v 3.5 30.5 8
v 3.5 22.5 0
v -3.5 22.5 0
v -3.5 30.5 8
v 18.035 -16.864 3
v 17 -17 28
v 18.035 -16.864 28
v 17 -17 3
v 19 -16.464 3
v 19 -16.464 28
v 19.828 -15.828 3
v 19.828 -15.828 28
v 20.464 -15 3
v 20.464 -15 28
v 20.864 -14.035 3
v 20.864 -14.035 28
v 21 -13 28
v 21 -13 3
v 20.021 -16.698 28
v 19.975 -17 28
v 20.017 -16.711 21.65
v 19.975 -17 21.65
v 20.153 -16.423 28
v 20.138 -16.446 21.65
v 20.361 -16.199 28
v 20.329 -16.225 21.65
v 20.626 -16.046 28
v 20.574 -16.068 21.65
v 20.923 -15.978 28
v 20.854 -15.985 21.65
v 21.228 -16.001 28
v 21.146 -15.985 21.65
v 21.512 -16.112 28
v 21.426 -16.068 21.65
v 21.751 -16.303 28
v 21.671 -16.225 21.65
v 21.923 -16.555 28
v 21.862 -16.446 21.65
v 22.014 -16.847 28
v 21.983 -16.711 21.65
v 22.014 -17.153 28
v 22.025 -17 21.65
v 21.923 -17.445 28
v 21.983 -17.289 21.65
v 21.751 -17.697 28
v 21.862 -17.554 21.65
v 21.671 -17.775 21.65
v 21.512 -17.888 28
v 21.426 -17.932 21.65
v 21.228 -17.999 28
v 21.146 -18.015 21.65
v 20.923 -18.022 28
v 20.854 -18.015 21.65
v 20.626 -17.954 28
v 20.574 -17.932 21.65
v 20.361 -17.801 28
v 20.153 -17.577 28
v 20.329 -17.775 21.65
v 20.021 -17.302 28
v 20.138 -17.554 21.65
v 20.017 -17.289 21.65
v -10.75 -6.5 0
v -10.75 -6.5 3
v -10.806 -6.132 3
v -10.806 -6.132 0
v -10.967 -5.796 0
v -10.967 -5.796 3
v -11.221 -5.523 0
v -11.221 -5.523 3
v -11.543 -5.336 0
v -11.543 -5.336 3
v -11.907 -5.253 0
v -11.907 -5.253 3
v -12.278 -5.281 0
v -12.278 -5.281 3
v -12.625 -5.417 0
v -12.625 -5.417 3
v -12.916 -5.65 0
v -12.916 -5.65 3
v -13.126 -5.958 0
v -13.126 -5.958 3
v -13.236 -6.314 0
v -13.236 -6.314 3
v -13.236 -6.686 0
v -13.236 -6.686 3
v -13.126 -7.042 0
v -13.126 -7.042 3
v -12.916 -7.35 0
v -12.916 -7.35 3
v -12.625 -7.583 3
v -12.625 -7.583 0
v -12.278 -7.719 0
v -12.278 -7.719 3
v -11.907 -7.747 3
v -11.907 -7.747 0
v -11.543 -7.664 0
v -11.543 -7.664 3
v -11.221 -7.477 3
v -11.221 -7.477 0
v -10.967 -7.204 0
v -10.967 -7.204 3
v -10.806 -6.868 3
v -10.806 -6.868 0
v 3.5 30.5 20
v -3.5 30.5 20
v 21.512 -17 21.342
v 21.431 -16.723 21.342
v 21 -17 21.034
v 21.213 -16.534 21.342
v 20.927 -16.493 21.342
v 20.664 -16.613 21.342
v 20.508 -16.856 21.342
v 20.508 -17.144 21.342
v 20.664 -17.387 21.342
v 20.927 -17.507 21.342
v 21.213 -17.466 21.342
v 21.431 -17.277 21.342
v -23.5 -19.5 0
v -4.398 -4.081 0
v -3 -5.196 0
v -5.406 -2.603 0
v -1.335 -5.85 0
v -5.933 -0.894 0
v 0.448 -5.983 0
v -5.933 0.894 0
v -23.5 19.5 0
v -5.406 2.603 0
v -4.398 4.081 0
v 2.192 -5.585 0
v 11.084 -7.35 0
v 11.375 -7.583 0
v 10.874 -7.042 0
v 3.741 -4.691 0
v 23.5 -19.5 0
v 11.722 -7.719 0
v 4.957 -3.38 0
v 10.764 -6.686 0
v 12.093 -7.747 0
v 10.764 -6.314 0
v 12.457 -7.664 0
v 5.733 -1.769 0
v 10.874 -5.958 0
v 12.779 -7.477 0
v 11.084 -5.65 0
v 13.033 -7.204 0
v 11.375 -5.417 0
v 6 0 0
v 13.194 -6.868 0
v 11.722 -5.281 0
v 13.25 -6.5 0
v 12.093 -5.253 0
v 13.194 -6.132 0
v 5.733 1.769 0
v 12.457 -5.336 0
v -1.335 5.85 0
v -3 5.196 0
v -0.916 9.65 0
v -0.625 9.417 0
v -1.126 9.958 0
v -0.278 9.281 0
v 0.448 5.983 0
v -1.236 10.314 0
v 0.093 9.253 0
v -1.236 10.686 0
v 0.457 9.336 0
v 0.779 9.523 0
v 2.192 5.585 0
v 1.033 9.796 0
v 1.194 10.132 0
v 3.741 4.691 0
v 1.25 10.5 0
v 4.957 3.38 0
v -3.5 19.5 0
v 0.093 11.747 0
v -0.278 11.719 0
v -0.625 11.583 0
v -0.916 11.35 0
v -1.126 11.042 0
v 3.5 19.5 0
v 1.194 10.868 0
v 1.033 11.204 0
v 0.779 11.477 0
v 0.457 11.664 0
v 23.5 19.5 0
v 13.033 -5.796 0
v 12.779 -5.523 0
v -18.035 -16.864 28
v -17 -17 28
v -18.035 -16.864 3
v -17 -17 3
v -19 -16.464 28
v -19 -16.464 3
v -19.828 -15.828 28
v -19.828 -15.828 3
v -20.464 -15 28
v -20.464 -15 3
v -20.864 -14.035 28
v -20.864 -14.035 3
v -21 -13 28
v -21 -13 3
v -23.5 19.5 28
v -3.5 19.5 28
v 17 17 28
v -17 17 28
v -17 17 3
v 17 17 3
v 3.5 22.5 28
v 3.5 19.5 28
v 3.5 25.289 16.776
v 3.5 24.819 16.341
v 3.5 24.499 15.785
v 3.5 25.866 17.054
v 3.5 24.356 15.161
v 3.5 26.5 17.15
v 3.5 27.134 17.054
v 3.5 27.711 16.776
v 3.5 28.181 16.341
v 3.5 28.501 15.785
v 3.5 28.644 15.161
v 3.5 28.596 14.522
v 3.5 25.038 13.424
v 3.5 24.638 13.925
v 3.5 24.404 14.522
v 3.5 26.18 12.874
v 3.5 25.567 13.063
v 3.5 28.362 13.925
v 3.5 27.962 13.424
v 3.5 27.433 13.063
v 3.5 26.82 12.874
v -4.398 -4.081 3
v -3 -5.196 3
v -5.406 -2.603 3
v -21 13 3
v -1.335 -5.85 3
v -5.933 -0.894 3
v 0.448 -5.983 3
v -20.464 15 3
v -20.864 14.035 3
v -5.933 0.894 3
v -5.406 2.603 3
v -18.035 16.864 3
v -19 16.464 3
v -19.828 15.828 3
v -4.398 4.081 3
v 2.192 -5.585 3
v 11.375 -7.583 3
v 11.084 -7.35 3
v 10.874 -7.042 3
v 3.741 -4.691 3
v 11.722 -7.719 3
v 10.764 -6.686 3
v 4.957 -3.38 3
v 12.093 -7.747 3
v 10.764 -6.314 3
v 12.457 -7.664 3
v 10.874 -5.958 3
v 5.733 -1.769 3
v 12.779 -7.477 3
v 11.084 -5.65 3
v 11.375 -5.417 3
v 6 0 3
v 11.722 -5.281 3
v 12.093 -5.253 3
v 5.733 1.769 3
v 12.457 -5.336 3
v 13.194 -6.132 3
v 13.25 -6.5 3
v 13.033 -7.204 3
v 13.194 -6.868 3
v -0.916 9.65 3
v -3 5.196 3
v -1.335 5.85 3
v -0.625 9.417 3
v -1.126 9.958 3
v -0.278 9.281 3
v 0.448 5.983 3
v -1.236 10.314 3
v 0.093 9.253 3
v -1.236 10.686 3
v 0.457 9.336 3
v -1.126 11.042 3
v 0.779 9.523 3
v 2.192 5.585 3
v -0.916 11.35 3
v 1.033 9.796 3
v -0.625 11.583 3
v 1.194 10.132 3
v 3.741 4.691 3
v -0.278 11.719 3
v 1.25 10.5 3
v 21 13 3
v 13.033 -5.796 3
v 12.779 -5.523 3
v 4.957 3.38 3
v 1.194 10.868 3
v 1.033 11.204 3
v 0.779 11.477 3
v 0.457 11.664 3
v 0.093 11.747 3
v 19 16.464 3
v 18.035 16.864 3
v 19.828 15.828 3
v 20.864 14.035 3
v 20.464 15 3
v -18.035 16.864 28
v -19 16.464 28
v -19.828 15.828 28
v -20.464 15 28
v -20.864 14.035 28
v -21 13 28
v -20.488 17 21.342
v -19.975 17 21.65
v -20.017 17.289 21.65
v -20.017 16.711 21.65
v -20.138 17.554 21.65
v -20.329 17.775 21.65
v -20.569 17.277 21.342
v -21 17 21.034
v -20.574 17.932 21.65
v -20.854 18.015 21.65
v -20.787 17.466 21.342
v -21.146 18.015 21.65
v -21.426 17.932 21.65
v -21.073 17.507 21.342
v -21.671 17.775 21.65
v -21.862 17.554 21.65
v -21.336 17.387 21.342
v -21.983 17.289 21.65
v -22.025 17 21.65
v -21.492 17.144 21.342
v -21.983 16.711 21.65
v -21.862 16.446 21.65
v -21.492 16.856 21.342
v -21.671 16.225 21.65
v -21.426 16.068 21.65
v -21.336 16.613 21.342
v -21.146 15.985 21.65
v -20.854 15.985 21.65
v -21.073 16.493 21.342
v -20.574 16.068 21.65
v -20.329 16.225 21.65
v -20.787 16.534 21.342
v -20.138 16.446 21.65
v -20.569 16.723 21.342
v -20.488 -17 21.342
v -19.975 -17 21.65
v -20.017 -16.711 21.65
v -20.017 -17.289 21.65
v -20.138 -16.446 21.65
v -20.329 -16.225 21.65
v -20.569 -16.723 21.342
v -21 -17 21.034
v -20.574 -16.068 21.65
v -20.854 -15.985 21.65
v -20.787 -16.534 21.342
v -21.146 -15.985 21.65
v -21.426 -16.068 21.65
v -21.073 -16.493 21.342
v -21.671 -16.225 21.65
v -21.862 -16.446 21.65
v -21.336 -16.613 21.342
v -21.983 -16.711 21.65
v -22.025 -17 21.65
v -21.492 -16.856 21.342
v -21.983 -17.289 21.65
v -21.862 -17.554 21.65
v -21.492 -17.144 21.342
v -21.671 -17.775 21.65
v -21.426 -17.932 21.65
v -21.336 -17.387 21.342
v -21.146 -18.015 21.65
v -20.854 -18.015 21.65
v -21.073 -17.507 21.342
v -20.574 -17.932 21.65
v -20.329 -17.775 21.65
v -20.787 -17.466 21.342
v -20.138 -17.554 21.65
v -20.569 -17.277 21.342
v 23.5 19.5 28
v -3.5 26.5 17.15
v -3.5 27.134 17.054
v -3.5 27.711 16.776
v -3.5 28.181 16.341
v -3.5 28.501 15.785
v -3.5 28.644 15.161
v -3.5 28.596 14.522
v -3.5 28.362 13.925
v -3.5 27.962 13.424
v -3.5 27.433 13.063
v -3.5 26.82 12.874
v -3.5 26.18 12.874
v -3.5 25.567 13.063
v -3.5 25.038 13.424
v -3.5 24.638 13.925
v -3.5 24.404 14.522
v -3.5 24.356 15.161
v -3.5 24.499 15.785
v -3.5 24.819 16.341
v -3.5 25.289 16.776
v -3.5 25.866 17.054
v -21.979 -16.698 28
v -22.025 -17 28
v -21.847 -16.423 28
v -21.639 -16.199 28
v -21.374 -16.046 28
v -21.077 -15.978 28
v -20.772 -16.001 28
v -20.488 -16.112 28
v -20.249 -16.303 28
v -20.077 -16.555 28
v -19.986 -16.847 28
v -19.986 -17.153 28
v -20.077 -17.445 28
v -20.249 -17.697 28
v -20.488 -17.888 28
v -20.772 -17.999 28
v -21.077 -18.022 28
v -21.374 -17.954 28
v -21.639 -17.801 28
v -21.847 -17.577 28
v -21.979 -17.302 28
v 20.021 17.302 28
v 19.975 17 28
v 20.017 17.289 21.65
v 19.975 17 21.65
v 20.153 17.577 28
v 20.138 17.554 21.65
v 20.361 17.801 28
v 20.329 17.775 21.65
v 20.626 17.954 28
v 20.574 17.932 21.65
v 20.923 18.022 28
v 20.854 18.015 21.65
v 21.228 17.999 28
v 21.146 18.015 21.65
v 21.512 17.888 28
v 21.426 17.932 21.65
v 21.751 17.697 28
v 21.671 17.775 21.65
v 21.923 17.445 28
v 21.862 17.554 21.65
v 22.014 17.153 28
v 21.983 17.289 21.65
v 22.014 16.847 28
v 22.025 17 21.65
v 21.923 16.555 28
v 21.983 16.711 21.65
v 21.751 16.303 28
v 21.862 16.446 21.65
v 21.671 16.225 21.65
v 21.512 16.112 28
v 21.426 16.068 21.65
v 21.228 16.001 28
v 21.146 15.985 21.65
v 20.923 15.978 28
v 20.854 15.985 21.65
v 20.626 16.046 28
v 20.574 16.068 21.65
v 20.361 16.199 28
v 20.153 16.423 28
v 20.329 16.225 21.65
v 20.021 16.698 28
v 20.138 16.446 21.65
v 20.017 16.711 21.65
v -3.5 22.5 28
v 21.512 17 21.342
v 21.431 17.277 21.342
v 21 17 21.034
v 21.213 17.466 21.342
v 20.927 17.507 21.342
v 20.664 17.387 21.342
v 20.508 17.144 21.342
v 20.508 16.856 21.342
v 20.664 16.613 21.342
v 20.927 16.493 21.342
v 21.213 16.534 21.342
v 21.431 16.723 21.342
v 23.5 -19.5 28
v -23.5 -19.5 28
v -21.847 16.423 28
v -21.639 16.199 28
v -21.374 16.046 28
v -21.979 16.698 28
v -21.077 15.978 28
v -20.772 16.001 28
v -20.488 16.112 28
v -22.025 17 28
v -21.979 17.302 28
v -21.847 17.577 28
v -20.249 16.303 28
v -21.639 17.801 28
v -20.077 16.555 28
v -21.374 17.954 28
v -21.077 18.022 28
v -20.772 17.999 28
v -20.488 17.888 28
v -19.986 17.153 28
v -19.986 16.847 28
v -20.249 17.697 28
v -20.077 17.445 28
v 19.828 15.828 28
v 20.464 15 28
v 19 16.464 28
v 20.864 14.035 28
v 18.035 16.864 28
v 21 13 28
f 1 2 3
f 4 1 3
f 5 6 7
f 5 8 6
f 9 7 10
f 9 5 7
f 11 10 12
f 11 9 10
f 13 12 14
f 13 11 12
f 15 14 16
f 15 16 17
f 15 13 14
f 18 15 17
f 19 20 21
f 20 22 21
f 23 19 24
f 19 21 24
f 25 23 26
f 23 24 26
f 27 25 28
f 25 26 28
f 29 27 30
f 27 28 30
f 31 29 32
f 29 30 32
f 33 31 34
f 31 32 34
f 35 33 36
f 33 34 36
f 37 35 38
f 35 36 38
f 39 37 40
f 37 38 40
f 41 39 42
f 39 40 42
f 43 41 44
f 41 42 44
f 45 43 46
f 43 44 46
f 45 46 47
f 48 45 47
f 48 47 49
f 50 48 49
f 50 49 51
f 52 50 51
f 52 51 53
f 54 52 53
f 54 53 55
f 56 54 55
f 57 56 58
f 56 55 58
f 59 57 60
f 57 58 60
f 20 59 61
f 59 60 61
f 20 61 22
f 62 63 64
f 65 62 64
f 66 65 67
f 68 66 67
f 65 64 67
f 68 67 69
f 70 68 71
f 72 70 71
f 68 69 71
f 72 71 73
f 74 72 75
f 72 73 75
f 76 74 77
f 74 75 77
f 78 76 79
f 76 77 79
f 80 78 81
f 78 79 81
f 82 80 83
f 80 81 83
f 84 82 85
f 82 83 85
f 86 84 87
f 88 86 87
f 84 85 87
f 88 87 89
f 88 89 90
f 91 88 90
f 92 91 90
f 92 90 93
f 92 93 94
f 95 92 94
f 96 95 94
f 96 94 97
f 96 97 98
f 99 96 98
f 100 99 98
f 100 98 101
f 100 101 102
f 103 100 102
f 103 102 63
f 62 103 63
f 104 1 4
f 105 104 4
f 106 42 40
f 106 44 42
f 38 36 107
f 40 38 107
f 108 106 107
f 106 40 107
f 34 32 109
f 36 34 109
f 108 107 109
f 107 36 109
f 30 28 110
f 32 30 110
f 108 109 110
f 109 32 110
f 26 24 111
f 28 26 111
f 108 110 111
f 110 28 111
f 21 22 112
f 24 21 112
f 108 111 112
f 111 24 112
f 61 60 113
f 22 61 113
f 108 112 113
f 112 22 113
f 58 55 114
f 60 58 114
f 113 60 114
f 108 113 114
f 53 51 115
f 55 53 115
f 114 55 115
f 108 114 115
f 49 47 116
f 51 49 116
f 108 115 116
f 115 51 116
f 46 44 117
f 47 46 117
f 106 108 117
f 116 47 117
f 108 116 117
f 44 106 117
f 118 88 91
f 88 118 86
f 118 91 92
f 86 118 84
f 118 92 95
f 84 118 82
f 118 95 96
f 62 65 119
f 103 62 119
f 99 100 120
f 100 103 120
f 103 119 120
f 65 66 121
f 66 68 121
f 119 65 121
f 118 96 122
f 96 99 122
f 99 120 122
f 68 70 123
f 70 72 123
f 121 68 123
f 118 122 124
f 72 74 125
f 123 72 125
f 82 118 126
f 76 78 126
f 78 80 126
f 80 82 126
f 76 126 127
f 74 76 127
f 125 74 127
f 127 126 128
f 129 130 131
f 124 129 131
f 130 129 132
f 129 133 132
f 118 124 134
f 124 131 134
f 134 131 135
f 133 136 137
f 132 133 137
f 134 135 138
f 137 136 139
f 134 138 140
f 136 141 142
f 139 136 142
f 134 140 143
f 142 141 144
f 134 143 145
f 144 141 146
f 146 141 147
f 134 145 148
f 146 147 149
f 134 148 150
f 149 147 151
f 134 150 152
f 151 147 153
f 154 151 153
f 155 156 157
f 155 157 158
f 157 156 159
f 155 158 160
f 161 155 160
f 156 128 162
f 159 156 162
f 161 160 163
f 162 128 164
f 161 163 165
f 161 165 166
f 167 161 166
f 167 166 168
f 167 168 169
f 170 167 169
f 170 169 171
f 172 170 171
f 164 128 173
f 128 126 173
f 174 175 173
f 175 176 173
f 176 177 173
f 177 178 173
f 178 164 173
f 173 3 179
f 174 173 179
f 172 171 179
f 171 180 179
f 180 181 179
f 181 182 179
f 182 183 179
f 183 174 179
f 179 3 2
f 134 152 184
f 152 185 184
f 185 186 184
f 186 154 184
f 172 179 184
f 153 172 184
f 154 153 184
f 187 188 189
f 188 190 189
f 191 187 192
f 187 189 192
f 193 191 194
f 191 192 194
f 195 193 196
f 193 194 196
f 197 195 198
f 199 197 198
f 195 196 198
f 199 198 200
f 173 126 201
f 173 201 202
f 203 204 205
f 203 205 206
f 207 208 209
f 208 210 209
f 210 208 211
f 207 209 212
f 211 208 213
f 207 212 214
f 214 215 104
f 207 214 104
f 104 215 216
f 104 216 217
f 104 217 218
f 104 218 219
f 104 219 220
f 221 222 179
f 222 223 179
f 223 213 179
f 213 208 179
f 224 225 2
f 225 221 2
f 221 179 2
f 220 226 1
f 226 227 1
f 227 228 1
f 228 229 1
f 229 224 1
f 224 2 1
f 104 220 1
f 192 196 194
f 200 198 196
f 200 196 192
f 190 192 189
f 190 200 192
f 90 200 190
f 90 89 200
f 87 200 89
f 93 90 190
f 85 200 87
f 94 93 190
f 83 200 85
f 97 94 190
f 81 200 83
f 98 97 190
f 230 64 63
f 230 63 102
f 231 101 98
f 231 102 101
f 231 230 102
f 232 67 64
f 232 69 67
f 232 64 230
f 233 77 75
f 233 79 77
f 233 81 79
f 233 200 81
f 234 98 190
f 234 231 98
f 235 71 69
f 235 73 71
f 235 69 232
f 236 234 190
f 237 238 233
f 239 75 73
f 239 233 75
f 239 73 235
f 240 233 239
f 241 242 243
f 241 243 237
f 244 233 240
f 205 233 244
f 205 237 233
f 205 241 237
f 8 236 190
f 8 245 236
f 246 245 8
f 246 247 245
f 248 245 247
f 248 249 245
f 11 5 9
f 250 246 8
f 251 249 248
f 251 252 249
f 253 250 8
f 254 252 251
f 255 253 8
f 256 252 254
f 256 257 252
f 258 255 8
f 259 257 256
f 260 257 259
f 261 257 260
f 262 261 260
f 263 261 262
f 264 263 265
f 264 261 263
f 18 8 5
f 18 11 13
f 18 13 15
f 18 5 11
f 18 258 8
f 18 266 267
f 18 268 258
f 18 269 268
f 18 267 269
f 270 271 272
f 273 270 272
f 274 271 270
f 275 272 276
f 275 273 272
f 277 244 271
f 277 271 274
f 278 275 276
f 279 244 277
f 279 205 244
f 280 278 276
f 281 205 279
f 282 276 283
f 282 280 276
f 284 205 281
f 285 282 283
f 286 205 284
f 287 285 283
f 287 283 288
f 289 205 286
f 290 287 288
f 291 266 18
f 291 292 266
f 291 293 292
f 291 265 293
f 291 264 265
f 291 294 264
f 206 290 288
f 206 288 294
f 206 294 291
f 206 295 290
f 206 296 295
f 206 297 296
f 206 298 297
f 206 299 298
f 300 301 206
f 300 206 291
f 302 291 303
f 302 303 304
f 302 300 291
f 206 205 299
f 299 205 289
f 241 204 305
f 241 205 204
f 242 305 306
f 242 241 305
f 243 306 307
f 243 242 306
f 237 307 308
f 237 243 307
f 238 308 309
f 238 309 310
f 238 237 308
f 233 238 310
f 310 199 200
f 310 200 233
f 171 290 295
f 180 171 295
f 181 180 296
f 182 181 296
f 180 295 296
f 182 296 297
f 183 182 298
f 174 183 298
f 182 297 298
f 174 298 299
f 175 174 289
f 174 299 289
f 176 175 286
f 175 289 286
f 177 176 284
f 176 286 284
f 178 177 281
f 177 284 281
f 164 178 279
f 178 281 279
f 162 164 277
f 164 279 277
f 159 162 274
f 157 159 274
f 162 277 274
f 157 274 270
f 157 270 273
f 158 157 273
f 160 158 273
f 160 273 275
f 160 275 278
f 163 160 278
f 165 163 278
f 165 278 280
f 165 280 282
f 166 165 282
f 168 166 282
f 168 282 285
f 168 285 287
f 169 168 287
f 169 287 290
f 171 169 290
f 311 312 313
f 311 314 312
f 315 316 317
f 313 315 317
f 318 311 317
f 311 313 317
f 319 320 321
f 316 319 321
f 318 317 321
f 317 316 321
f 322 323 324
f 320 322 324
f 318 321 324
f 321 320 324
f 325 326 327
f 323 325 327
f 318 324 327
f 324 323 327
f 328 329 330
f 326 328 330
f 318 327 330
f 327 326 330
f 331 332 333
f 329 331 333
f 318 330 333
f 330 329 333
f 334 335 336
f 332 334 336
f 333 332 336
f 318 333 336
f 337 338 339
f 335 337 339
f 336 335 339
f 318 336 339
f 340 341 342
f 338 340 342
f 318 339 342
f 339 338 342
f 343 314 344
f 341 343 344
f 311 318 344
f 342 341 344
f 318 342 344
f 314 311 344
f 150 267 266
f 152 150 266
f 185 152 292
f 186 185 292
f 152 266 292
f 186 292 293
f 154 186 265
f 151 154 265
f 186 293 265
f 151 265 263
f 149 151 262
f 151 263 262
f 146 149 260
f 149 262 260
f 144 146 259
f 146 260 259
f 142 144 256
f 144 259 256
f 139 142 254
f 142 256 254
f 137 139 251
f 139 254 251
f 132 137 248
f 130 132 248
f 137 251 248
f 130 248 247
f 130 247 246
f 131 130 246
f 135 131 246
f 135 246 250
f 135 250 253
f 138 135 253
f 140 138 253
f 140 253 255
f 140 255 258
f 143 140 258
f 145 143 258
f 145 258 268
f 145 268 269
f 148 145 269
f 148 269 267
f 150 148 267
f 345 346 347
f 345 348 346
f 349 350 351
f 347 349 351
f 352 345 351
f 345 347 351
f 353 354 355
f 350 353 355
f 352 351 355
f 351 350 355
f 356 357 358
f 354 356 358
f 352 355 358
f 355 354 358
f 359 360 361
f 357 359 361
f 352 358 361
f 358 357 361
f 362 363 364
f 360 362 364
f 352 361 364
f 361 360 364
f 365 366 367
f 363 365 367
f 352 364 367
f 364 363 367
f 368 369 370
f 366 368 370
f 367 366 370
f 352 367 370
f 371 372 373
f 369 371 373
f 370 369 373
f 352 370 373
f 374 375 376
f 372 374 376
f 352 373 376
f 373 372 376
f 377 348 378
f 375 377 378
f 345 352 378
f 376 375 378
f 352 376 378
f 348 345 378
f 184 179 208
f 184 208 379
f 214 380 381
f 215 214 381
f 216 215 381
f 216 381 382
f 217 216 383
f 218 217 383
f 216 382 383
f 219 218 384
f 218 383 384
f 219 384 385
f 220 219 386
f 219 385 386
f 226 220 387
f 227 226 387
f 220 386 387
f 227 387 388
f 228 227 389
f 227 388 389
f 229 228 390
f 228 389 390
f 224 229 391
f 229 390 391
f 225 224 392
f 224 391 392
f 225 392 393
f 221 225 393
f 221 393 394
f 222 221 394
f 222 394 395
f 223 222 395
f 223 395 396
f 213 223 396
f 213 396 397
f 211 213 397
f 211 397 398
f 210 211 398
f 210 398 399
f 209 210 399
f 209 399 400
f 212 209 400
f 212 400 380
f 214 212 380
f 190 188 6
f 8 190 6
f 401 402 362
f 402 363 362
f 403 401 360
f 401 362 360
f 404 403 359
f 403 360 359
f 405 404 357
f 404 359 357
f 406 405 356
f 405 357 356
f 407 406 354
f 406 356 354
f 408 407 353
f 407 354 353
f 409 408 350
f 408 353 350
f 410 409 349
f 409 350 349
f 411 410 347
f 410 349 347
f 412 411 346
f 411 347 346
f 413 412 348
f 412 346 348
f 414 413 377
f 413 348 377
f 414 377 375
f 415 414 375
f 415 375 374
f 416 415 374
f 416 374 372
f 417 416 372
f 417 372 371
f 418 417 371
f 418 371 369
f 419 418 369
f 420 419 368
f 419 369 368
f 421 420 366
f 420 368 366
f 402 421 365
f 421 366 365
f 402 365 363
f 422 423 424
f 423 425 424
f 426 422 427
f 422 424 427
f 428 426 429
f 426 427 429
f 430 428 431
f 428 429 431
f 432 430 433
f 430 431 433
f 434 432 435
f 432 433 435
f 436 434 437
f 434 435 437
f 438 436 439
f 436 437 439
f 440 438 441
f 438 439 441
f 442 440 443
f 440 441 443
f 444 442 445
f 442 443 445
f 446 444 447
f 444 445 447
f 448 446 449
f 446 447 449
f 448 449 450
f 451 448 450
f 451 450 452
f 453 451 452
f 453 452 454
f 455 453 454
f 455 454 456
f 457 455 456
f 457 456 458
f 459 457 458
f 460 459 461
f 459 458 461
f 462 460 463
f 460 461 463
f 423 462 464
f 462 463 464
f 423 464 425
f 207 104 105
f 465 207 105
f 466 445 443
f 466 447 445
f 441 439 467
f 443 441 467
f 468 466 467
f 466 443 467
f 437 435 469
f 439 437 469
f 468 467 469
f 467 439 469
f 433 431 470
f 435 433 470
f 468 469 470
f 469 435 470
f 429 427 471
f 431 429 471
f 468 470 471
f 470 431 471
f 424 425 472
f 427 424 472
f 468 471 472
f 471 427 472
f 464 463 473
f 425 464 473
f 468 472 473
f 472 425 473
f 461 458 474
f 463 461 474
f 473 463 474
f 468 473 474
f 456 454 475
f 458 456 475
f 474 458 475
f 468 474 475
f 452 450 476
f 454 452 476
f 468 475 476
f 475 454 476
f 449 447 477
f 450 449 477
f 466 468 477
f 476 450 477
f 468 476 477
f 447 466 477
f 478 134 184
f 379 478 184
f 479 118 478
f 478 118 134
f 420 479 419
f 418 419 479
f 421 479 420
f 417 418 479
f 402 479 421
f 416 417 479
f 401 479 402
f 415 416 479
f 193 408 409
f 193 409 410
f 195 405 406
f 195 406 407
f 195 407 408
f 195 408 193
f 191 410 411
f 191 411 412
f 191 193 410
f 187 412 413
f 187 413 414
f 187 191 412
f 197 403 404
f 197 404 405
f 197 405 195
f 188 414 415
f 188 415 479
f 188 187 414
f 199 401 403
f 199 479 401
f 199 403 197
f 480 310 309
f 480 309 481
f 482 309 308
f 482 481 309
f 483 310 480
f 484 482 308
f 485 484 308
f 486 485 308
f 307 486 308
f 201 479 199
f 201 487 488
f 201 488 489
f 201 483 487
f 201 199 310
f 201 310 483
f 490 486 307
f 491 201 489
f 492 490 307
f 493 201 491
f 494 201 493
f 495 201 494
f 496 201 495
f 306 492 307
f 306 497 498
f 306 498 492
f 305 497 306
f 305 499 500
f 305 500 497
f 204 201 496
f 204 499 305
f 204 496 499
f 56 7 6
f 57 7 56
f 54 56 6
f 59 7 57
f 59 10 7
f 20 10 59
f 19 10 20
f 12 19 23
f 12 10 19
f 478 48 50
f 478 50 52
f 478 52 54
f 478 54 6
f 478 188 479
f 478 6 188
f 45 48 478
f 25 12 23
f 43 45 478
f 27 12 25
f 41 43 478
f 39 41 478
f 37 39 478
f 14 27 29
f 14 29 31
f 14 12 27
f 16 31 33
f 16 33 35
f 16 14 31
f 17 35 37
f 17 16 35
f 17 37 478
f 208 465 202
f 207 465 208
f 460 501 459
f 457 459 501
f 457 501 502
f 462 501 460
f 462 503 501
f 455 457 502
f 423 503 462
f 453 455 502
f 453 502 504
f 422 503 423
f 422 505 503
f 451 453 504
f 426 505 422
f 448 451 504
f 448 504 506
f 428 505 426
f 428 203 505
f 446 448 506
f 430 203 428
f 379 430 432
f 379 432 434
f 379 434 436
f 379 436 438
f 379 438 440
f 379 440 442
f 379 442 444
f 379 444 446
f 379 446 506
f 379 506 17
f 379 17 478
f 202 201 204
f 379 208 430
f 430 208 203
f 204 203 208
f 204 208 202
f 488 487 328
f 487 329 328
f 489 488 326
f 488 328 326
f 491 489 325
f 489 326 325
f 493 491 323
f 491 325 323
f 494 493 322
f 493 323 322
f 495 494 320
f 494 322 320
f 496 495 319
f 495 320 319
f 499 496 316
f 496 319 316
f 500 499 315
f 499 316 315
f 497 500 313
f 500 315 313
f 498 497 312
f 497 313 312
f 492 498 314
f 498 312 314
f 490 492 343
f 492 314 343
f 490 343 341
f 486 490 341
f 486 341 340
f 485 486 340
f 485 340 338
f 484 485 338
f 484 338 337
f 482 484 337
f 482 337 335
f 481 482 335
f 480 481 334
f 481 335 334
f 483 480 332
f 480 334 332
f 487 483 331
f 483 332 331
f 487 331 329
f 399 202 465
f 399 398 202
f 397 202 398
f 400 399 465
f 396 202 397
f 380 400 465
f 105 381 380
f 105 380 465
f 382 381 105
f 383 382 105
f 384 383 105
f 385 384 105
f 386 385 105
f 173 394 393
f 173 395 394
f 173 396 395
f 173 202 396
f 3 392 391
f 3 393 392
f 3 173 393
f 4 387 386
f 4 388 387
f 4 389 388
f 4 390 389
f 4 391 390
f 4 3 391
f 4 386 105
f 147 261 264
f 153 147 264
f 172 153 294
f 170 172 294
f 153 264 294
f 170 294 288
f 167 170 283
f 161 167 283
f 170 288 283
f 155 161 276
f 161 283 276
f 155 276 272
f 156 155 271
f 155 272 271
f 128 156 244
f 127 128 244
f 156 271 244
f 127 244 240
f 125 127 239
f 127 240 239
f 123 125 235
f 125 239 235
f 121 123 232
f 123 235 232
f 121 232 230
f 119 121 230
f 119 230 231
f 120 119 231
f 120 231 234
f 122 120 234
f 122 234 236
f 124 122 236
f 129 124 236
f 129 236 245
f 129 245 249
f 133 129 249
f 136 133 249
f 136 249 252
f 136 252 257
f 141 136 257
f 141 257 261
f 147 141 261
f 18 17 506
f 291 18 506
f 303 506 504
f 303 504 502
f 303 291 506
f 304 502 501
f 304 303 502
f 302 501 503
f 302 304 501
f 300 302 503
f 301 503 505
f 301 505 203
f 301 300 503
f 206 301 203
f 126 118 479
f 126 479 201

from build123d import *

# Parameters (mm, degrees)
SKETCH_1_W               = 47
SKETCH_1_H               = 39
EXTRUDE_1_DEPTH          = 28
SKETCH_4_W               = 42
SKETCH_4_H               = 34
CUT_EXTRUDE_1_DEPTH      = 25
FILLET_1_R               = 4
HOLE_WIZARD_M2_5_1_D     = 2.05
HOLE_WIZARD_M2_5_1_DEPTH = 6.35
HOLE_WIZARD_M2_5_1_TIP   = 0.615882135
HOLE_WIZARD_M3_1_D       = 2.5
CUT_EXTRUDE_2_REACH      = 41.465
SKETCH_10_R              = 6
SKETCH_11_W              = 7
SKETCH_11_H              = 11
EXTRUDE_2_DEPTH          = 28
HOLE_WIZARD_M4_1_D       = 4.3
CHAMFER_1_SIZE           = 8


with BuildPart() as part:
    # 草图1 → 凸台-拉伸1 (new body)
    with BuildSketch(Plane.XY):
        Rectangle(SKETCH_1_W, SKETCH_1_H)
    extrude(amount=EXTRUDE_1_DEPTH)

    # 草图4 → 切除-拉伸1 (cut)
    with BuildSketch(Plane.XY.offset(28)):
        Rectangle(SKETCH_4_W, SKETCH_4_H)
    extrude(amount=-CUT_EXTRUDE_1_DEPTH, mode=Mode.SUBTRACT)

    # 圆角1
    fillet_1_edges = [part.edges().sort_by_distance(p)[0] for p in [
        (-21, 17, 15.5),
        (-21, -17, 15.5),
        (21, -17, 15.5),
        (21, 17, 15.5),
    ]]
    fillet(fillet_1_edges, radius=FILLET_1_R)

    # M2.5 螺纹孔1
    with Locations(Plane.XY.offset(28)):
        with Locations((21, 17), (-21, -17), (-21, 17), (21, -17)):
            Hole(HOLE_WIZARD_M2_5_1_D / 2, depth=HOLE_WIZARD_M2_5_1_DEPTH)
            with Locations((0, 0, -(HOLE_WIZARD_M2_5_1_DEPTH + HOLE_WIZARD_M2_5_1_TIP / 2))):  # 118° drill point
                Cone(0, HOLE_WIZARD_M2_5_1_D / 2, HOLE_WIZARD_M2_5_1_TIP, mode=Mode.SUBTRACT)

    # M3 螺纹孔1 (through all)
    with Locations(Plane(origin=(0, 0, 0), x_dir=(-1, 0, 0), z_dir=(0, 0, -1))):
        with Locations((-12, -6.5), (12, -6.5), (0, 10.5)):
            Hole(HOLE_WIZARD_M3_1_D / 2)

    # 草图10 → 切除-拉伸2 (cut, up to next)
    with BuildSketch(Plane.XY.offset(3), mode=Mode.PRIVATE) as cut_extrude_2_sk1:
        Circle(SKETCH_10_R)
    cut_extrude_2_tool1 = extrude(cut_extrude_2_sk1.sketch, amount=-CUT_EXTRUDE_2_REACH, mode=Mode.PRIVATE) & part.part
    add(cut_extrude_2_tool1.solids().sort_by_distance((0, 0, 3))[0], mode=Mode.SUBTRACT)

    # 草图11 → 凸台-拉伸2 (add)
    with BuildSketch(Plane(origin=(0, 0, 0), x_dir=(-1, 0, 0), z_dir=(0, 0, -1))):
        with Locations((0, 25)):
            Rectangle(SKETCH_11_W, SKETCH_11_H)
    extrude(amount=-EXTRUDE_2_DEPTH)

    # M4 间隙孔1 (through all)
    with Locations(Plane(origin=(3.5, 0, 0), x_dir=(0, 0, -1), z_dir=(1, 0, 0))):
        with Locations((-15, 26.5)):
            Hole(HOLE_WIZARD_M4_1_D / 2)

    # 倒角1
    chamfer_1_edges = [part.edges().sort_by_distance(p)[0] for p in [
        (0, 30.5, 28),
        (0, 30.5, 0),
    ]]
    chamfer(chamfer_1_edges, length=CHAMFER_1_SIZE)


solid = part.part
